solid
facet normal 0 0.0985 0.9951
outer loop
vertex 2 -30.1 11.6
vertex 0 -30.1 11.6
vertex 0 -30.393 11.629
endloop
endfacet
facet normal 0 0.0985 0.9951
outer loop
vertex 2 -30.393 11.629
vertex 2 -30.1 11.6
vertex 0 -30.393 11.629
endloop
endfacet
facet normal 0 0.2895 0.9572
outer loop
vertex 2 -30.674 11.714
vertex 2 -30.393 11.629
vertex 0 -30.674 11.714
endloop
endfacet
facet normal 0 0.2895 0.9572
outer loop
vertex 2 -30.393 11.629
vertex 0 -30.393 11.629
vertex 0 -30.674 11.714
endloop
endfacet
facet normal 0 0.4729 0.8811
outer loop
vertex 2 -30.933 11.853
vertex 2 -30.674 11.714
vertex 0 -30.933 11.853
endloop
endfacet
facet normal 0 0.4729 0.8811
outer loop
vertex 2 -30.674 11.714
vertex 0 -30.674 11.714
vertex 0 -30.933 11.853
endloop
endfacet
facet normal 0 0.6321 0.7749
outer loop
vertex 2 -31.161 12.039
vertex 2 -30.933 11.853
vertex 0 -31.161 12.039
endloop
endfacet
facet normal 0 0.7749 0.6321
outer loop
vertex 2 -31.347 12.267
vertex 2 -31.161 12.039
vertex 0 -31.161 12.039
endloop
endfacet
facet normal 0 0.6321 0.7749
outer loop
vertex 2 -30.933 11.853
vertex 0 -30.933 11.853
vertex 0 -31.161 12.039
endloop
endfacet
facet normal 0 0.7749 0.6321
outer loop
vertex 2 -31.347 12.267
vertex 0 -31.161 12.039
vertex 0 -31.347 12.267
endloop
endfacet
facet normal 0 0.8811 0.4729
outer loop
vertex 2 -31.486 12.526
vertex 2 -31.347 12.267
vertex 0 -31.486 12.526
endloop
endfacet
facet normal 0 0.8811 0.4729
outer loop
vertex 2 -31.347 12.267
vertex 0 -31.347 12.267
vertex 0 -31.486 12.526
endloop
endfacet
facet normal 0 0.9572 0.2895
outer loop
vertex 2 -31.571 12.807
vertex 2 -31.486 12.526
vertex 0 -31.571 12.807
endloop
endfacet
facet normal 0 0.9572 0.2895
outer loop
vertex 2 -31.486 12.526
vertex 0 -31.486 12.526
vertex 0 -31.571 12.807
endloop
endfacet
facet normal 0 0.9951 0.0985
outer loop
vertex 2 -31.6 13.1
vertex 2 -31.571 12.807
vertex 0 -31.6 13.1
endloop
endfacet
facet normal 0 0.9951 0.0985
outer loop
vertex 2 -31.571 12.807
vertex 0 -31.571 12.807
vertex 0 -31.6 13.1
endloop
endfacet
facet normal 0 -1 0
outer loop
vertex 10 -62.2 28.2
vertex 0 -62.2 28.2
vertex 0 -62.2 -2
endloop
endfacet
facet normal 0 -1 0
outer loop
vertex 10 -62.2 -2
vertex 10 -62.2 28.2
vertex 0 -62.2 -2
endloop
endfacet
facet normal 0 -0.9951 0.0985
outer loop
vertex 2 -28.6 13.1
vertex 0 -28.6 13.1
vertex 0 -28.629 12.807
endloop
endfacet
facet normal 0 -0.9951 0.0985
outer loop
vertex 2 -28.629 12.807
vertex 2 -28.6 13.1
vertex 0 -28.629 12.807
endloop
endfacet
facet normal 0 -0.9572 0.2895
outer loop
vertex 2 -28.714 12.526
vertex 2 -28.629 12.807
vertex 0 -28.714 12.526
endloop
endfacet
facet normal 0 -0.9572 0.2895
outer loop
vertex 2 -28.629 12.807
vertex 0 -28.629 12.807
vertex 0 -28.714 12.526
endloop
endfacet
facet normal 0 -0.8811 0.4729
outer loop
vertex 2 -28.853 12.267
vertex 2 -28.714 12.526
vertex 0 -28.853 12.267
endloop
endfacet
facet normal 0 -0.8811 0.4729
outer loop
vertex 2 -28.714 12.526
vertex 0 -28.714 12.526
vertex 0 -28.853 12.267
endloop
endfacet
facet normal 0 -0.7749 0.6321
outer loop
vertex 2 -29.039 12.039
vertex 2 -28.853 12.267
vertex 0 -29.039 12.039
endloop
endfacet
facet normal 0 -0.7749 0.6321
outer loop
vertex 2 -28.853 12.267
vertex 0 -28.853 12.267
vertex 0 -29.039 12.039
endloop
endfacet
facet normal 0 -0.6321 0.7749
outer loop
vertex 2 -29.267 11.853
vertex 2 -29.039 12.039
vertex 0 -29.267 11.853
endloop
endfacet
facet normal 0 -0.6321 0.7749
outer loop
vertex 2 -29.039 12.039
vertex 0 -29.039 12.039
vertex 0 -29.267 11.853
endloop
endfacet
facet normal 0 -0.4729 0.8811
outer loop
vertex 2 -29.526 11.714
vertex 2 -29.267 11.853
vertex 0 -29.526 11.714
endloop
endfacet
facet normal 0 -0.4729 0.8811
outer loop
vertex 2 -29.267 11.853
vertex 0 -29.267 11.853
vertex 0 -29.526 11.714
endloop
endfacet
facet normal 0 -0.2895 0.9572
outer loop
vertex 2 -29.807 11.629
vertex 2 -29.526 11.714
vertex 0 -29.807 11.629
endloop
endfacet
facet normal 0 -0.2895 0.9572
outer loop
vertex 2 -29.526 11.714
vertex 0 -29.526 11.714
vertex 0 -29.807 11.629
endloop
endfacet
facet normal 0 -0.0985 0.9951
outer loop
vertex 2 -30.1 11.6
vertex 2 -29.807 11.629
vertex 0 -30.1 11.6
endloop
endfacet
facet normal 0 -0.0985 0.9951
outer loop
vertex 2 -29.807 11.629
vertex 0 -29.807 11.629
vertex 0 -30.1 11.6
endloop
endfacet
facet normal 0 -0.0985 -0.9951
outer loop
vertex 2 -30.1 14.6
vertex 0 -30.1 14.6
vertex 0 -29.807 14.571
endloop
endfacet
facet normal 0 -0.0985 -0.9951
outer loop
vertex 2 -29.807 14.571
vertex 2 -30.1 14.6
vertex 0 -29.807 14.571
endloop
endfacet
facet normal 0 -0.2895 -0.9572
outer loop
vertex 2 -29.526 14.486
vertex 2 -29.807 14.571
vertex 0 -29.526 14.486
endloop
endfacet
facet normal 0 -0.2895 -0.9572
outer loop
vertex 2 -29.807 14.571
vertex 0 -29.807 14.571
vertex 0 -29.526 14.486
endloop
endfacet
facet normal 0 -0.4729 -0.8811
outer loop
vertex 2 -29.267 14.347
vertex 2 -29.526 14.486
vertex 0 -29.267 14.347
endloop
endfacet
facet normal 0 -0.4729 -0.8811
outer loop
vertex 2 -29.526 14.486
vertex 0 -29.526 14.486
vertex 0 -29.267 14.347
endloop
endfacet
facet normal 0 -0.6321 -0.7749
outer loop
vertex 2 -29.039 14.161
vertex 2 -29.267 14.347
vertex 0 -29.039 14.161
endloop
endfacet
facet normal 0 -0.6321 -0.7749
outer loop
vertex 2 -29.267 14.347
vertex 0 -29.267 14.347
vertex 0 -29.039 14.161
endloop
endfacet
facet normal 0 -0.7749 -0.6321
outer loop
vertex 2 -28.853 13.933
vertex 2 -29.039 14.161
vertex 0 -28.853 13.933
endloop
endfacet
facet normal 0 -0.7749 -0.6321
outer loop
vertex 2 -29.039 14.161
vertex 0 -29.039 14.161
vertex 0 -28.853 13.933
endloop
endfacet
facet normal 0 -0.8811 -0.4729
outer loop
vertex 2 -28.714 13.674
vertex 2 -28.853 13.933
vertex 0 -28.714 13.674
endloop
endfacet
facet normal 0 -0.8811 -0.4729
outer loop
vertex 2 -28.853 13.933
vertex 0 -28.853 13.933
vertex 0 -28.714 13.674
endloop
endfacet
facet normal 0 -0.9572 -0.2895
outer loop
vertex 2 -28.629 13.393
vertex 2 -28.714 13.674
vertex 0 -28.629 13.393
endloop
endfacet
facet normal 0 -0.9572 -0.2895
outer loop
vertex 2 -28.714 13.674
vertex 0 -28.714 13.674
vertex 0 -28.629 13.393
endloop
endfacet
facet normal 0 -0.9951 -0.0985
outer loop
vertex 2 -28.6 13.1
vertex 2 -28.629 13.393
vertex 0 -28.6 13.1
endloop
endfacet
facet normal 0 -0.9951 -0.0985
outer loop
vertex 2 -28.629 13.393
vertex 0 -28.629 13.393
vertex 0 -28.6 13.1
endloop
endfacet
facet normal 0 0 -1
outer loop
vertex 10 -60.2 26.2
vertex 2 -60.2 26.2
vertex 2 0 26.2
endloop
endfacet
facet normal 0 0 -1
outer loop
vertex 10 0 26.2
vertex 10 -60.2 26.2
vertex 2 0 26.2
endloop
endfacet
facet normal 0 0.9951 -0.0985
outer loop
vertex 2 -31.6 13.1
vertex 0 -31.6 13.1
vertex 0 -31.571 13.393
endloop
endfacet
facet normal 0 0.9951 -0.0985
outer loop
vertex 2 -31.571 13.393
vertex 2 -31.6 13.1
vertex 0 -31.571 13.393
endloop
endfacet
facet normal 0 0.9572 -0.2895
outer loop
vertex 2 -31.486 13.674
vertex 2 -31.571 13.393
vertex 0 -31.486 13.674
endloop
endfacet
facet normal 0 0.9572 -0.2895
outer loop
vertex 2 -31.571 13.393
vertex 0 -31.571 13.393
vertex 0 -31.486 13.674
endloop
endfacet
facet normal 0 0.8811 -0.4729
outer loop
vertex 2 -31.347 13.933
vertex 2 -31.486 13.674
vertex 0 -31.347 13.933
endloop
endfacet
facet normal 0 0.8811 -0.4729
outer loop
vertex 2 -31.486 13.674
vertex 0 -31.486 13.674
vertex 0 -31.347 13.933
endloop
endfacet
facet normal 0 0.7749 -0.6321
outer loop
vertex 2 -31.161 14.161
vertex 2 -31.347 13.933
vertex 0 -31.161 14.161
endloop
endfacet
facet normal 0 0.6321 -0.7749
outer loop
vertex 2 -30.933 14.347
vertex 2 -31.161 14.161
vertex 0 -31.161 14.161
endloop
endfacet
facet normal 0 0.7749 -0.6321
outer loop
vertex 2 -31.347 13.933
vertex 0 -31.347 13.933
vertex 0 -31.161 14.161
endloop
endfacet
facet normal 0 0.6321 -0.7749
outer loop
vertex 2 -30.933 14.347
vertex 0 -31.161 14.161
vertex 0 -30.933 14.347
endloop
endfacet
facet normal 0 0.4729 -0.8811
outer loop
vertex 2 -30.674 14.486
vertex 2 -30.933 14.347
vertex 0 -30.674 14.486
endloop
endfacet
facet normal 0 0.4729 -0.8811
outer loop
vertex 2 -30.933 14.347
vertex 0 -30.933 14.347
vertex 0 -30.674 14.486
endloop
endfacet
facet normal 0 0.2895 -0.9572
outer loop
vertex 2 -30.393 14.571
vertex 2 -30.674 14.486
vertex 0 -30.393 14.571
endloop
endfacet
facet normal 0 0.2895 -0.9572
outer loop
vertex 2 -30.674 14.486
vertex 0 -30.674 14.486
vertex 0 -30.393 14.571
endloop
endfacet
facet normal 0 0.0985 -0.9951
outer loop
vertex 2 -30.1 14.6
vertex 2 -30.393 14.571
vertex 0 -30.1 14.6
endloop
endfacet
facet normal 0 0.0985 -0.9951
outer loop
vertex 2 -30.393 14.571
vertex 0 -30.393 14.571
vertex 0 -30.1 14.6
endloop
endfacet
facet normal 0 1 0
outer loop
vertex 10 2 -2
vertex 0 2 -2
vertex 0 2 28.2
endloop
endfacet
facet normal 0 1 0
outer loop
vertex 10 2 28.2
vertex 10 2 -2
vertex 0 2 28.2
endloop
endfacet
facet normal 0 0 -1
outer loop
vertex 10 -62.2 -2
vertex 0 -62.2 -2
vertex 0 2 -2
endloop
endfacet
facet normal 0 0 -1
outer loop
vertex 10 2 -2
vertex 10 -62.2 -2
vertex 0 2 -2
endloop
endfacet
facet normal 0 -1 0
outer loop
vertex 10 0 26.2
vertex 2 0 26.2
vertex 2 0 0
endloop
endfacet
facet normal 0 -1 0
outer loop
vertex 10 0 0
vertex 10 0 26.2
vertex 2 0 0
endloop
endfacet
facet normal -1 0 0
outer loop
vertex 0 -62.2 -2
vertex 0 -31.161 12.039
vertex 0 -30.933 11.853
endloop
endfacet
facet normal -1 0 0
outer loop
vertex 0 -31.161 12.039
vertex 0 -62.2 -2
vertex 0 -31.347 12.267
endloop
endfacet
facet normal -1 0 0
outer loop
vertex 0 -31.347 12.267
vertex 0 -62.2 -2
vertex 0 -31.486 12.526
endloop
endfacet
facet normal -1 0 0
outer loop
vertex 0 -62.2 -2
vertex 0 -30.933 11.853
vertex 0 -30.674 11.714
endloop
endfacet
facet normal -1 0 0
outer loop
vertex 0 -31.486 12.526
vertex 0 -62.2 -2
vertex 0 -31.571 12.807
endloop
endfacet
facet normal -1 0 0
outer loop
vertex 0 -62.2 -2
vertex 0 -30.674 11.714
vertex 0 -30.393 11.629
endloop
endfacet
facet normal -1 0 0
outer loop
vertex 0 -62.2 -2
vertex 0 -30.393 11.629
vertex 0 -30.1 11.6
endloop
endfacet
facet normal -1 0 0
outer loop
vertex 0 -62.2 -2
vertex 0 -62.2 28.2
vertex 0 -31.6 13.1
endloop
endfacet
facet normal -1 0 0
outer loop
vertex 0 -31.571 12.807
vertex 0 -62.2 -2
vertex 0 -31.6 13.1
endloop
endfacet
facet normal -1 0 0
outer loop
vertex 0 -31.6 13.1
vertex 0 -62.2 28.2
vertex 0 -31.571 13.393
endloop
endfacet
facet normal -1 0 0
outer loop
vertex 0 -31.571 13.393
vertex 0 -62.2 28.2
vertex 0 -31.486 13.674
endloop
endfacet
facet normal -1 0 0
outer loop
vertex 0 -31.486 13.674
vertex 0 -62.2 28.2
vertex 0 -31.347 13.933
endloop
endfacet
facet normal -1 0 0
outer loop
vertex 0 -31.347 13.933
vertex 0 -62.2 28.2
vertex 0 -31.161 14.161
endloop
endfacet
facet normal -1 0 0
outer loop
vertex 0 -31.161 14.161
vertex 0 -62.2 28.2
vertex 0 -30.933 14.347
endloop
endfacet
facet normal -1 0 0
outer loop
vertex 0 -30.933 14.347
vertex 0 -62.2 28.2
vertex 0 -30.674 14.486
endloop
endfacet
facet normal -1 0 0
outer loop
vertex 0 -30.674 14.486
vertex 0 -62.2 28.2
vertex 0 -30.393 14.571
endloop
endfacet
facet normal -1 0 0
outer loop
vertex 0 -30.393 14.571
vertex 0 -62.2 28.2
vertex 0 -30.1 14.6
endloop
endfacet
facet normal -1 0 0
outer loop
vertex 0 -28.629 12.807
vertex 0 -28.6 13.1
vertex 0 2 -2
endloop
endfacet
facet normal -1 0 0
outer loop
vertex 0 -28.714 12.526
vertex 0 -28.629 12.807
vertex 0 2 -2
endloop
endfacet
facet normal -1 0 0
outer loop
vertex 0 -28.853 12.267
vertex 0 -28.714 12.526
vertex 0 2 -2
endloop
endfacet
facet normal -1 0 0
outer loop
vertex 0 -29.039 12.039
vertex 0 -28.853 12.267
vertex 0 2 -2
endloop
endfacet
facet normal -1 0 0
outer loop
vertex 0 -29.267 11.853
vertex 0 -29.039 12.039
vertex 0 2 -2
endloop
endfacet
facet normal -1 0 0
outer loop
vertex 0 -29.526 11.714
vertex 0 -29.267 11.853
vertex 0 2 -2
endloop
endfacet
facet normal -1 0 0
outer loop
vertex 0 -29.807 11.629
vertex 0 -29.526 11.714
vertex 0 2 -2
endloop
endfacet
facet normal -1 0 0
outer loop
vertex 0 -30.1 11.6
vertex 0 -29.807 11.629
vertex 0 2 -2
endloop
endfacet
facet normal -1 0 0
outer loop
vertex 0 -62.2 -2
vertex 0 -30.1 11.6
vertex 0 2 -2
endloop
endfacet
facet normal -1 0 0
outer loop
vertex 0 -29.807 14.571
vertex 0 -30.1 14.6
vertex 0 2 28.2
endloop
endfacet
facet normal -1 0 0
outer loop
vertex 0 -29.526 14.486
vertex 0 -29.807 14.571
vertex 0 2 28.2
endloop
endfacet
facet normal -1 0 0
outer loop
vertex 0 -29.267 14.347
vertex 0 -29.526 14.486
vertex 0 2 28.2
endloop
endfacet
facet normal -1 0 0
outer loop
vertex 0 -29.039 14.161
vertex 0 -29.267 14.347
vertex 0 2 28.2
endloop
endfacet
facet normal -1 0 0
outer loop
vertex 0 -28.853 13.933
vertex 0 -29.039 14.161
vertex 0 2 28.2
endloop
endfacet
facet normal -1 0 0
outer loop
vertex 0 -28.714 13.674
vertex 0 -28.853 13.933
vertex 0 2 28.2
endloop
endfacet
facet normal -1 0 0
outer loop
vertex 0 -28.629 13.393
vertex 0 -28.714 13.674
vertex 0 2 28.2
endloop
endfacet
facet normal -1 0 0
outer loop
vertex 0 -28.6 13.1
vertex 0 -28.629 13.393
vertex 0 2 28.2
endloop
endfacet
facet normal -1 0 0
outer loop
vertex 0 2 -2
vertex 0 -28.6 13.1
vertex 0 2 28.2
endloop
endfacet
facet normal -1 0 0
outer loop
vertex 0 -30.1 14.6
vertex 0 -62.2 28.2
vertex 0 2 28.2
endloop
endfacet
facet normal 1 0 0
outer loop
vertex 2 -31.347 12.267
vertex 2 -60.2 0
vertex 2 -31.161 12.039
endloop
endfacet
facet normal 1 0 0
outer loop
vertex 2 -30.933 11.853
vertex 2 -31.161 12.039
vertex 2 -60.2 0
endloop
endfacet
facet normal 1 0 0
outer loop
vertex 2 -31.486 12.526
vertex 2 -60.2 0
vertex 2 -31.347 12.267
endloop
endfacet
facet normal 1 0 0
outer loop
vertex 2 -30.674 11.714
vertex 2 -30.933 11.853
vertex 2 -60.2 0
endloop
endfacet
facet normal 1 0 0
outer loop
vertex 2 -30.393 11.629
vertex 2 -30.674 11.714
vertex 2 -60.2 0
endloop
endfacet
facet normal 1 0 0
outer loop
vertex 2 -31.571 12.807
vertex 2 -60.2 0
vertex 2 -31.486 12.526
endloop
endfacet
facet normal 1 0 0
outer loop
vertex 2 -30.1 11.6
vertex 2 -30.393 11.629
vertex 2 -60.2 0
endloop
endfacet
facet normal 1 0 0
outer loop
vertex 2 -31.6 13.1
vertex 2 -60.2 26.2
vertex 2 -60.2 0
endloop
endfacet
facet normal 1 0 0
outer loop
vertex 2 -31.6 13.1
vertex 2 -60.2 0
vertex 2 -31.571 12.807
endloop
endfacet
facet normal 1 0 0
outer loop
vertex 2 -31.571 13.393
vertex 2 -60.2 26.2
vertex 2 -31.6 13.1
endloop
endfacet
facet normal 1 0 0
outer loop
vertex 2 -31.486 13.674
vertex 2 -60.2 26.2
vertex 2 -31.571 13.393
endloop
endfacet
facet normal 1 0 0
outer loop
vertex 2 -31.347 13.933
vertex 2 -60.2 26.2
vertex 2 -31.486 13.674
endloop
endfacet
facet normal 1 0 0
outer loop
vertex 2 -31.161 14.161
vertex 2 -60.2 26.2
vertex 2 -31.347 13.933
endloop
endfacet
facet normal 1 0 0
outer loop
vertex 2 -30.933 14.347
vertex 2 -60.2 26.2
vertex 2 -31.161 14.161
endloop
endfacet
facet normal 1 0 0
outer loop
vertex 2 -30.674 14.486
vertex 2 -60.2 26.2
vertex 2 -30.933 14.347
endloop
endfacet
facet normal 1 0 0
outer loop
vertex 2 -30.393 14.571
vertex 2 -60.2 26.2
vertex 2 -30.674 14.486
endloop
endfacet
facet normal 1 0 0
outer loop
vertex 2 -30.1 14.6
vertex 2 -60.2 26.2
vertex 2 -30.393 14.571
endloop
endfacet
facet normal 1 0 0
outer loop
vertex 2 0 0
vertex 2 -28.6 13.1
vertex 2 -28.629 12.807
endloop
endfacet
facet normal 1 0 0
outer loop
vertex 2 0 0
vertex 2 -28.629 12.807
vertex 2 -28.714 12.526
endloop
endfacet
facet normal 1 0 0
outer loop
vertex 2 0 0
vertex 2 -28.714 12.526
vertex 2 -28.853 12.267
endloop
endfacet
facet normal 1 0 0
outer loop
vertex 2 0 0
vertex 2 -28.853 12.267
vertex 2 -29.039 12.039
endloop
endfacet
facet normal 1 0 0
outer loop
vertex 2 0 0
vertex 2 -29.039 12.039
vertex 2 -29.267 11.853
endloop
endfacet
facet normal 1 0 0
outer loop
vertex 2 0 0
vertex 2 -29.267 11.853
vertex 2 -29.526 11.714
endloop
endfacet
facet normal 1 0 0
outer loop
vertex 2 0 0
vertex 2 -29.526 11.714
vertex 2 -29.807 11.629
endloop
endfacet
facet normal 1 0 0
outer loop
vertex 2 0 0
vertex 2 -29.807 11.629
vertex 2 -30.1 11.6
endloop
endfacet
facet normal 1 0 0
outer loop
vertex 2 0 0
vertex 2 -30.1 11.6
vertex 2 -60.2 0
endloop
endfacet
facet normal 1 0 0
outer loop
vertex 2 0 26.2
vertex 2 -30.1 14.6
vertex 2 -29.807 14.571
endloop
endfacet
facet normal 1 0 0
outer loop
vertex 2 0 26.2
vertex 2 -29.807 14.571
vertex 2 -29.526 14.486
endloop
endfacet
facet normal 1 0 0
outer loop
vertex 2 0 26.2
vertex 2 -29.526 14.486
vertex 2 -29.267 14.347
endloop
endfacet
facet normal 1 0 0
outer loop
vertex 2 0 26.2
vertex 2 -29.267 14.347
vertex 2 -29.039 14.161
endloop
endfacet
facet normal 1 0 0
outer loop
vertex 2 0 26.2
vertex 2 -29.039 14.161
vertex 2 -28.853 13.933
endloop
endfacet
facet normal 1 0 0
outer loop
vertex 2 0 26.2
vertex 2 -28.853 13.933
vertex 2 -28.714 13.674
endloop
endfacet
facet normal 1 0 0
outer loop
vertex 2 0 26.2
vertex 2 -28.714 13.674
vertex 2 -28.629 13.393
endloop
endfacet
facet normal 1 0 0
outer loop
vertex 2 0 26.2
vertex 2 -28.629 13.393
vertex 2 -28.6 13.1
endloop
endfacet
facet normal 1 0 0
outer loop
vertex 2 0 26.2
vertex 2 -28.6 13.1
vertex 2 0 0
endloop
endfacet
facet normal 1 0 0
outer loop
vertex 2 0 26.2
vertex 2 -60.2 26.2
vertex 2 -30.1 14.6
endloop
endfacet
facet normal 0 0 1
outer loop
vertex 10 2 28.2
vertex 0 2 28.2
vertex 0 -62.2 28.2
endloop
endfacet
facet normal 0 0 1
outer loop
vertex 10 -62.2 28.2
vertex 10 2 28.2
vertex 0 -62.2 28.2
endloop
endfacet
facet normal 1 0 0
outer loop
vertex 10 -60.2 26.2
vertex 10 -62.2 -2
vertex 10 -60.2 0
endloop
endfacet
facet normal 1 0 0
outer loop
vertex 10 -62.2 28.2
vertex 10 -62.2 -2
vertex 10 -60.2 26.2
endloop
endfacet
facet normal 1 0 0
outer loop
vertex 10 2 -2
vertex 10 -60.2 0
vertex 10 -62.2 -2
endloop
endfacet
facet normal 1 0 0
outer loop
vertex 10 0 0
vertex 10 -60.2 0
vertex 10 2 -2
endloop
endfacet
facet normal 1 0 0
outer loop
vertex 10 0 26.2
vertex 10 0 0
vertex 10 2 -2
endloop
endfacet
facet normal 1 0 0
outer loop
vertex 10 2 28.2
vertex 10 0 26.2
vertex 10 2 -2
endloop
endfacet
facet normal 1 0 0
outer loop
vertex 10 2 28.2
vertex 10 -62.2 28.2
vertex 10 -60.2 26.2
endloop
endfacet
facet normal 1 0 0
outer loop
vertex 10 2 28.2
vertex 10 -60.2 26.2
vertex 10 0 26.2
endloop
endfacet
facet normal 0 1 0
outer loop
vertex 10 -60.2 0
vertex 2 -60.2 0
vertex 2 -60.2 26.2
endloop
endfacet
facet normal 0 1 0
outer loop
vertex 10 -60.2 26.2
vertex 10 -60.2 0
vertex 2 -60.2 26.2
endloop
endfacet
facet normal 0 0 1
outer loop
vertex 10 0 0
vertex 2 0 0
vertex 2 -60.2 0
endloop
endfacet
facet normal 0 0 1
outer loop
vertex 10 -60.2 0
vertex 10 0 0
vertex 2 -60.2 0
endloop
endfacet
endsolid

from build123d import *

# Parameters (mm, degrees)
F1_DEPTH = 2
F2_DEPTH = 10


with BuildPart() as f1:
    # F0 (on Right) → F1 (new body)
    with BuildSketch(Plane.YZ):
        Polygon((2, 0), (0, 0), (-30.1, 0), (-60.2, 0), (-62.2, 0), (-62.2, -2), (2, -2), align=None)
        Polygon((0, 26.2), (0, 0), (2, 0), (2, 28.2), (-30.1, 28.2), (-30.1, 26.2), align=None)
        with BuildLine():
            Line((-60.2, 0), (-30.1, 0))
            Line((-30.1, 0), (-30.1, 11.6))
            ThreePointArc((-30.1, 11.6), (-31.16066, 12.03934), (-31.6, 13.1))
            ThreePointArc((-31.6, 13.1), (-31.16066, 14.16066), (-30.1, 14.6))
            Line((-30.1, 14.6), (-30.1, 26.2))
            Line((-30.1, 26.2), (-60.2, 26.2))
            Line((-60.2, 26.2), (-60.2, 0))
        make_face()
        Polygon((-62.2, 0), (-60.2, 0), (-60.2, 26.2), (-30.1, 26.2), (-30.1, 28.2), (-62.2, 28.2), align=None)
        with BuildLine():
            Line((-30.1, 0), (0, 0))
            Line((0, 0), (0, 26.2))
            Line((0, 26.2), (-30.1, 26.2))
            Line((-30.1, 26.2), (-30.1, 14.6))
            ThreePointArc((-30.1, 14.6), (-29.03934, 14.16066), (-28.6, 13.1))
            ThreePointArc((-28.6, 13.1), (-29.03934, 12.03934), (-30.1, 11.6))
            Line((-30.1, 11.6), (-30.1, 0))
        make_face()
    extrude(amount=F1_DEPTH)

    # F0 (on Right) → F2 (join)
    with BuildSketch(Plane.YZ):
        Polygon((0, 26.2), (0, 0), (2, 0), (2, 28.2), (-30.1, 28.2), (-30.1, 26.2), align=None)
        Polygon((2, 0), (0, 0), (-30.1, 0), (-60.2, 0), (-62.2, 0), (-62.2, -2), (2, -2), align=None)
        Polygon((-62.2, 0), (-60.2, 0), (-60.2, 26.2), (-30.1, 26.2), (-30.1, 28.2), (-62.2, 28.2), align=None)
    extrude(amount=F2_DEPTH)


solid = f1.part
